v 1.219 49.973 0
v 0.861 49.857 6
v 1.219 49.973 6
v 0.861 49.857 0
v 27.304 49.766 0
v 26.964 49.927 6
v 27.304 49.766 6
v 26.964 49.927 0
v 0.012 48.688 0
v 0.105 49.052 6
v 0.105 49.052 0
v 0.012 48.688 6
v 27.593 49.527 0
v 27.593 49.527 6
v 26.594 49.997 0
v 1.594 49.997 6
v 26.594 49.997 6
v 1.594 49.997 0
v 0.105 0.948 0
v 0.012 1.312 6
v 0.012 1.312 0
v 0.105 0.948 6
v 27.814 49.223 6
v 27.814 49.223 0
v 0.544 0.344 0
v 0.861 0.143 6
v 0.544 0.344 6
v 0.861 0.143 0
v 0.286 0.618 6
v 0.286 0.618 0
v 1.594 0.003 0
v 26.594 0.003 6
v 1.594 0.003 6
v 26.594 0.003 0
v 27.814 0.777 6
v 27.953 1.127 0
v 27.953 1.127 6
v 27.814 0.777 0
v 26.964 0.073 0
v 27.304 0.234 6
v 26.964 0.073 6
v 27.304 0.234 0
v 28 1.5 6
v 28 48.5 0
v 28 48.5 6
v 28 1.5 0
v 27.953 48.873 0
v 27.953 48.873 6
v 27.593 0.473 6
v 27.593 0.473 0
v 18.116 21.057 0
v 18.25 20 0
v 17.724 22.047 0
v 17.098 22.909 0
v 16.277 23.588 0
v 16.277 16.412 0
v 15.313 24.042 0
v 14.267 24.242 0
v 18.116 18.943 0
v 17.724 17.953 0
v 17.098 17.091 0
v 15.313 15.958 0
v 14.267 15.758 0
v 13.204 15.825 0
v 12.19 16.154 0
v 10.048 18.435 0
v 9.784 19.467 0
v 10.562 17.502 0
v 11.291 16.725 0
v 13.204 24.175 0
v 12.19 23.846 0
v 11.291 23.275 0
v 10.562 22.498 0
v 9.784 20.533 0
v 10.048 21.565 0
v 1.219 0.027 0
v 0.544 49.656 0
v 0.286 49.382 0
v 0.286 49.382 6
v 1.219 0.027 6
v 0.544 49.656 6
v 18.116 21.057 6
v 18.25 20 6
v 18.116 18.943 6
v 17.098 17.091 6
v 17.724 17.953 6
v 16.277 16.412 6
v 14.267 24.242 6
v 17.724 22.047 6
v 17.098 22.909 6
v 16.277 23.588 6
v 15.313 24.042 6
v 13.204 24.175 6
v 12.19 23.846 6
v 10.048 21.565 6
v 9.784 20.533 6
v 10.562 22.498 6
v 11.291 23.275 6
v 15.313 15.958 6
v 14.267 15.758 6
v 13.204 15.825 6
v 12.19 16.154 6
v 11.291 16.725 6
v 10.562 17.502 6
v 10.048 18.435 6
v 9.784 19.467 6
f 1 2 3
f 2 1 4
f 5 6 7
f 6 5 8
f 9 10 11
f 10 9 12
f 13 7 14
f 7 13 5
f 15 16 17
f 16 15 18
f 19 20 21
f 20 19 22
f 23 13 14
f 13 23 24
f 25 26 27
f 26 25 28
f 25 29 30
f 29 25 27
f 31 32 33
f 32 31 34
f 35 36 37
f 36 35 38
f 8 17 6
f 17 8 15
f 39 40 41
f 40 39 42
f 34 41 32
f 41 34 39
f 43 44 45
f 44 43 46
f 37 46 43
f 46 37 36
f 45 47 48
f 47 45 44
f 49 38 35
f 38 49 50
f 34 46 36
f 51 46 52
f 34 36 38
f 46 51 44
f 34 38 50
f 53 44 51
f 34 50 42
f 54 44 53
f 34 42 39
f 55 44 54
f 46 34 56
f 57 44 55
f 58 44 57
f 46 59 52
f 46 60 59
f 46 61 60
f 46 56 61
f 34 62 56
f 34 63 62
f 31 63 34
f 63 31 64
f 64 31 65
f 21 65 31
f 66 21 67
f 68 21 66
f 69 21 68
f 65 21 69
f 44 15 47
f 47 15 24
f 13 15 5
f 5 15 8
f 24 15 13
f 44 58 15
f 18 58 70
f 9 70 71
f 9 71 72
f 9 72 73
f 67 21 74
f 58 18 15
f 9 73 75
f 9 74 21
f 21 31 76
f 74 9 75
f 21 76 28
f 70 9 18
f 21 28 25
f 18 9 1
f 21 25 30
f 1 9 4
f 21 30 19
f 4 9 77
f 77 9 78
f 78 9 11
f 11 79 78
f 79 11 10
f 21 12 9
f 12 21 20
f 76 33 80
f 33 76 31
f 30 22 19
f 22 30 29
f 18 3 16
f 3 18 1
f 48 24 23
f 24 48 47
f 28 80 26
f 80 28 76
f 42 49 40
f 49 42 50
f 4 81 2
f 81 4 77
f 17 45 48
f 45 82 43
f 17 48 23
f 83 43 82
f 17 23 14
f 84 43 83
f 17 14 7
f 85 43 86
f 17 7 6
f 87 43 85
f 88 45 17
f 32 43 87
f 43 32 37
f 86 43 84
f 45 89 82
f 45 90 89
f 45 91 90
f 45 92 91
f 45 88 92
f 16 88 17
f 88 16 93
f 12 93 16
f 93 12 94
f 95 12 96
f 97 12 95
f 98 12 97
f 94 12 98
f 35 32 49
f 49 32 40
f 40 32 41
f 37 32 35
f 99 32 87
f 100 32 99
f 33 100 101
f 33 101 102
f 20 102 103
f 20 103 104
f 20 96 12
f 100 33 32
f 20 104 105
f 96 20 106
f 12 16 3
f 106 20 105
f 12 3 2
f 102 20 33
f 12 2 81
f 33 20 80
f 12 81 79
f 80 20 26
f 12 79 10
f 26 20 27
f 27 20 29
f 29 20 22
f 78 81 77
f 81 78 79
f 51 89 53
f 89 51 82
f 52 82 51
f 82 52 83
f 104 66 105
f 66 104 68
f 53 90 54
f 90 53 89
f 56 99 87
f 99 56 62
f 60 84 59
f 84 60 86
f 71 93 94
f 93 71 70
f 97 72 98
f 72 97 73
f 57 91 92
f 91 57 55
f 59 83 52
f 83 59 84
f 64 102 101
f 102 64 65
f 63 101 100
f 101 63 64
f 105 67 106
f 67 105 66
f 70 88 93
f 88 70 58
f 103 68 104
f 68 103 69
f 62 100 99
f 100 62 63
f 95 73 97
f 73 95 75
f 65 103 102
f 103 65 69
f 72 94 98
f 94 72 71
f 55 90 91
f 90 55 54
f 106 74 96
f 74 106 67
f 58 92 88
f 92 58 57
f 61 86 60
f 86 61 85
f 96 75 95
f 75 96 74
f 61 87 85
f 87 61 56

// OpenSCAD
difference() {
    translate([1.5,1.5,0])
    minkowski() {
        cube([25,47,5]);
        cylinder(r=1.5,1,$fn=25);
    }
        translate([14,20,-0.5])
        cylinder(r=4.25,7,$fn=25);
}
